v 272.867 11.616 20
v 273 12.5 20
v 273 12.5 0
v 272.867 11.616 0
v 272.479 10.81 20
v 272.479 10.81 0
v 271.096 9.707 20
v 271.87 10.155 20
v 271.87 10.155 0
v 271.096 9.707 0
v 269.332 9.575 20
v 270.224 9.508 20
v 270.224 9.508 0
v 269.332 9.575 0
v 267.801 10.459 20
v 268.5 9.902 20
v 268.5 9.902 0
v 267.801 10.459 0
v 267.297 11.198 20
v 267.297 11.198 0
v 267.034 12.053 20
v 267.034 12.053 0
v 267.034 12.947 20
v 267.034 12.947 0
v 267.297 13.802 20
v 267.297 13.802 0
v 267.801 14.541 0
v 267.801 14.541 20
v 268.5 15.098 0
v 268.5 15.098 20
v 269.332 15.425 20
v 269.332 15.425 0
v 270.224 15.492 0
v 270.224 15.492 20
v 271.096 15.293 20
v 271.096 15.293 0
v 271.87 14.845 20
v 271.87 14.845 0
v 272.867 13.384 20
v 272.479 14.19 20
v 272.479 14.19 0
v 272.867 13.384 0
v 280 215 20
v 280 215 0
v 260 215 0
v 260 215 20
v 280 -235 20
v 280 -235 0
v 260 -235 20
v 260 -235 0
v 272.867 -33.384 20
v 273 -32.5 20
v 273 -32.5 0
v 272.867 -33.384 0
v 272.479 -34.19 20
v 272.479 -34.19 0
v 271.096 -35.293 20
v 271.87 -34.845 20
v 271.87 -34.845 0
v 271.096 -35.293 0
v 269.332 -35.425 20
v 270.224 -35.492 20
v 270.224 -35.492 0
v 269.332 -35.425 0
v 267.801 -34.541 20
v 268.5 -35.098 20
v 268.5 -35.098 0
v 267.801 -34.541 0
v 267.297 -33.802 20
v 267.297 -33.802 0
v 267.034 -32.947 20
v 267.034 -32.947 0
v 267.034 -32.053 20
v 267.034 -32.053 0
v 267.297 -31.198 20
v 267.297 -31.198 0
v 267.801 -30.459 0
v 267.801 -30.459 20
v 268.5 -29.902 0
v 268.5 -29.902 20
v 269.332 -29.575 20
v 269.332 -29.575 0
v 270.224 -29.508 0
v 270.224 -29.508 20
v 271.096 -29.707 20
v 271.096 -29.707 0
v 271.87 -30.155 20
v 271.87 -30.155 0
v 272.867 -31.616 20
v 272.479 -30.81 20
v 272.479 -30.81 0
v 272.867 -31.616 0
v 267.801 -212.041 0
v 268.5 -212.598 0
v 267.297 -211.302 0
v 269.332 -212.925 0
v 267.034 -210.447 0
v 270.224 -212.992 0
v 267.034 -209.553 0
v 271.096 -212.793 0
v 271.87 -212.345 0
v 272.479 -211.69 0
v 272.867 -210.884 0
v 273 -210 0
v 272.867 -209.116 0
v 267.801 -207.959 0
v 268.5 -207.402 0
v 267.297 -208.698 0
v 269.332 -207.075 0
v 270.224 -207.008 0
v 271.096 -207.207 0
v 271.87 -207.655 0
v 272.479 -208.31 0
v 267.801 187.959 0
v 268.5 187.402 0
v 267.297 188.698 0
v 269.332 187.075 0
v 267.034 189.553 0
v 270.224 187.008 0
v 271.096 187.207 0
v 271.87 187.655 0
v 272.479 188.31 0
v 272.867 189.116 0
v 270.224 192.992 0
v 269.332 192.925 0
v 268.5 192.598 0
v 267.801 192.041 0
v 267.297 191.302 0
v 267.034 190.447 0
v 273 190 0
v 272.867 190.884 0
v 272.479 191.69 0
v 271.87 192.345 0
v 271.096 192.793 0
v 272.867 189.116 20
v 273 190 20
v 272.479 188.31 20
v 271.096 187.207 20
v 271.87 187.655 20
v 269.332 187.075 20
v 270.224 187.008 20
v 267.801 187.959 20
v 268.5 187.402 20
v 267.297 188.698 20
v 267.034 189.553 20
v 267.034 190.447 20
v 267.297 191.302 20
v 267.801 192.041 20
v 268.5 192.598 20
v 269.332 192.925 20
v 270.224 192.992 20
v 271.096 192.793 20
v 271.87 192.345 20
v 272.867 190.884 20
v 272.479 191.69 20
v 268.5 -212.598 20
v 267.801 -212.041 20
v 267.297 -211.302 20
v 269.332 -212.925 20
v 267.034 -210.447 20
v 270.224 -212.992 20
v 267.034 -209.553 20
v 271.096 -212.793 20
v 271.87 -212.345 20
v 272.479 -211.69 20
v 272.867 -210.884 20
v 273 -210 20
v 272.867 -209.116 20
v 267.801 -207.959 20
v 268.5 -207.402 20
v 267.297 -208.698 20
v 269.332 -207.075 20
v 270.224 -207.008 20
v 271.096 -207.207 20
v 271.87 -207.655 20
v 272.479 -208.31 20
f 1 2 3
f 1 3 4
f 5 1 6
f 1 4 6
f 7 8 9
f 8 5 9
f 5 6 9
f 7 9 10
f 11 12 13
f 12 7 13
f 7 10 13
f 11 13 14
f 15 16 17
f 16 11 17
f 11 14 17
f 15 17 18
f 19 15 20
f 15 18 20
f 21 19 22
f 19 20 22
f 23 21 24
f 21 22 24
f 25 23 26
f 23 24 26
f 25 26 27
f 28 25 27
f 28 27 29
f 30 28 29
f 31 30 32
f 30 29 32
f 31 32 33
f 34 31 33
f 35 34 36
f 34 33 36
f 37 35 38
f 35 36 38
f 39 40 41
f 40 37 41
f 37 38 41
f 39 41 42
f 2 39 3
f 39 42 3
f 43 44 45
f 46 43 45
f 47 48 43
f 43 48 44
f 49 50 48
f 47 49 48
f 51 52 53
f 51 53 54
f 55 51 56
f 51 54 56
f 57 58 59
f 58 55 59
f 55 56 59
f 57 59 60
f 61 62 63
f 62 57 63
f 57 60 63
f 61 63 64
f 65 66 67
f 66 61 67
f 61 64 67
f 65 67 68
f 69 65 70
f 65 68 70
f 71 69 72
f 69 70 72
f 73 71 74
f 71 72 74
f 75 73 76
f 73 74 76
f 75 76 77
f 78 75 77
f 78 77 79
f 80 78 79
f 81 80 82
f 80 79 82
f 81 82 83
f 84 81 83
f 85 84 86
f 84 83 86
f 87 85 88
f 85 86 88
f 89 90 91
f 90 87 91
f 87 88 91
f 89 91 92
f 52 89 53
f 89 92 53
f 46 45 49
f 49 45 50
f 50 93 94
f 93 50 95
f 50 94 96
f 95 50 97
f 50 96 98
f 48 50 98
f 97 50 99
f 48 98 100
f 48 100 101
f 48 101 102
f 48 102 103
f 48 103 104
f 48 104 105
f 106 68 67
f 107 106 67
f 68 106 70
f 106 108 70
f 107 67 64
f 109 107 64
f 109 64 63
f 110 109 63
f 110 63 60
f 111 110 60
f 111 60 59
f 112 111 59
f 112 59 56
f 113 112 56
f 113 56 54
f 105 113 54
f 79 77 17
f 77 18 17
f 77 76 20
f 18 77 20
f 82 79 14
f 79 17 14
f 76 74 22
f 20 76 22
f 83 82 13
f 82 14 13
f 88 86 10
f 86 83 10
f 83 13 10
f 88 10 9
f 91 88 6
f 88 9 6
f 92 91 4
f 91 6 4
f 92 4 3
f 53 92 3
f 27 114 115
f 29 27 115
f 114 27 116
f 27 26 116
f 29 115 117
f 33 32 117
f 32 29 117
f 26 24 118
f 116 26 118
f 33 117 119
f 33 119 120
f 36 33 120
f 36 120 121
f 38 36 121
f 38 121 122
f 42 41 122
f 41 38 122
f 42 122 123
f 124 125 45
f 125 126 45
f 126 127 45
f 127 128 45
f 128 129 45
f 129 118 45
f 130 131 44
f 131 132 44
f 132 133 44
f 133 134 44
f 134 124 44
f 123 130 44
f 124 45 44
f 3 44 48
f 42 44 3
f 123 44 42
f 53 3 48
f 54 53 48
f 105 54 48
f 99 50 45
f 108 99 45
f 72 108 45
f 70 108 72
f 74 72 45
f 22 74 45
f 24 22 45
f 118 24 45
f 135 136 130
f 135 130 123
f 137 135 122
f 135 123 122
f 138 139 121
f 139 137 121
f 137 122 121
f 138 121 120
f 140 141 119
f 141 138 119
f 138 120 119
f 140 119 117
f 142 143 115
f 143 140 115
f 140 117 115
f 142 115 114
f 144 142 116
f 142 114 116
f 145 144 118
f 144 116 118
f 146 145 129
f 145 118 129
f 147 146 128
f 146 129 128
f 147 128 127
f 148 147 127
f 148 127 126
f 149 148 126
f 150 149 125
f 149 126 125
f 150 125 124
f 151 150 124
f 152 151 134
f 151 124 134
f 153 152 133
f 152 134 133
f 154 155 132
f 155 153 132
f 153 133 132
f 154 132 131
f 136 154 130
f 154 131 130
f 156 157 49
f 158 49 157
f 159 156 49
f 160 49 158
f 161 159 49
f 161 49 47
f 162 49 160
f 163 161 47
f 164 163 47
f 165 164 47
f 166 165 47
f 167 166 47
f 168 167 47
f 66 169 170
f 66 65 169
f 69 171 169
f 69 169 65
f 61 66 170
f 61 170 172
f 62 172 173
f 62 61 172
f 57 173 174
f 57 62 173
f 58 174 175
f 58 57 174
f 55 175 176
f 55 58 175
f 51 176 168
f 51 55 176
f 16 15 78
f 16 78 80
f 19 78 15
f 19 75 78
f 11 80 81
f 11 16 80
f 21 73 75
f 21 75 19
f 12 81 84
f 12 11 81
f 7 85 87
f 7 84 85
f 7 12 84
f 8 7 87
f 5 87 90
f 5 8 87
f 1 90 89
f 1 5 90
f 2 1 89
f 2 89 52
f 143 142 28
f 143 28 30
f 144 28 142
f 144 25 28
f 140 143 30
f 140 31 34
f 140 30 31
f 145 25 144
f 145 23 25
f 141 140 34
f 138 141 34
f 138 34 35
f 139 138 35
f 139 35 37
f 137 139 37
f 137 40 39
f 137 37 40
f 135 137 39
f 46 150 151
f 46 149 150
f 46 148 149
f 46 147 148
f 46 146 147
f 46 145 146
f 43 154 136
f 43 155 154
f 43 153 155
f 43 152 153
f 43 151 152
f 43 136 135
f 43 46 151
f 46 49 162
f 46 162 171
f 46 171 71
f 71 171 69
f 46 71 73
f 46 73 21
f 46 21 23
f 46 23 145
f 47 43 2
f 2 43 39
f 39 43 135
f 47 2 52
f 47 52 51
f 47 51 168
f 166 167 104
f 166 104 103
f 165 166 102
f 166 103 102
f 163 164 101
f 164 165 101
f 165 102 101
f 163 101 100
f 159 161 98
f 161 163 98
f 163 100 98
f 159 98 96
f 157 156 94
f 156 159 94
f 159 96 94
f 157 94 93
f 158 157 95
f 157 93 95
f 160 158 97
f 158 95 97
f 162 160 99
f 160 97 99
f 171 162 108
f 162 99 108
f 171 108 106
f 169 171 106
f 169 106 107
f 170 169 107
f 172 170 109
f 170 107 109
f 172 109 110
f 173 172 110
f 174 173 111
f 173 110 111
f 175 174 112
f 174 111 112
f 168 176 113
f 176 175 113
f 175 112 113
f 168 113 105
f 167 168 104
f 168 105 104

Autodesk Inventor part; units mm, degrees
ref_plane "YZ Plane" through (0, 0, 0) normal (1, 0, 0) x (0, 1, 0)
ref_plane "XZ Plane" through (0, 0, 0) normal (0, 1, 0) x (-1, 0, 0)
ref_plane "XY Plane" through (0, 0, 0) normal (0, 0, 1) x (1, 0, 0)
sketch "草圖1" plane through (0, 0, 0) normal (0, 0, 1) x (1, 0, 0)
  line L0 (280, 215) -> (260, 215)
  line L1 (260, 215) -> (260, -235)
  line L2 (260, -235) -> (280, -235)
  line L3 (280, -235) -> (280, 215)
  line L4 (280, 215) -> (260, -235) construction
  line L5 (260, 215) -> (280, -235) construction
  circle A0 centre (270, 190) radius 3
  circle A1 centre (270, -210) radius 3
  circle A2 centre (270, 12.5) radius 3
  circle A3 centre (270, -32.5) radius 3
  point P0 (0, 0)
  point P1 (270, -10)
  dimension "d3" = 20
  dimension "d4" = 450
  dimension "d5" = 280
  dimension "d6" = 215
  dimension "d8" = 225
  dimension "d11" = 6
  dimension "d12" = 6
  dimension "d14" = 6
  dimension "d15" = 6
  dimension "d16" = 10
  dimension "d17" = 25
  dimension "d18" = 10
  dimension "d19" = 202.5
  dimension "d20" = 10
  dimension "d21" = 10
  dimension "d22" = 247.5
  dimension "d23" = 10
  dimension "d24" = 425
extrude "擠出1" add sketch "草圖1" along normal blind 20
properties part number "DOF1"
